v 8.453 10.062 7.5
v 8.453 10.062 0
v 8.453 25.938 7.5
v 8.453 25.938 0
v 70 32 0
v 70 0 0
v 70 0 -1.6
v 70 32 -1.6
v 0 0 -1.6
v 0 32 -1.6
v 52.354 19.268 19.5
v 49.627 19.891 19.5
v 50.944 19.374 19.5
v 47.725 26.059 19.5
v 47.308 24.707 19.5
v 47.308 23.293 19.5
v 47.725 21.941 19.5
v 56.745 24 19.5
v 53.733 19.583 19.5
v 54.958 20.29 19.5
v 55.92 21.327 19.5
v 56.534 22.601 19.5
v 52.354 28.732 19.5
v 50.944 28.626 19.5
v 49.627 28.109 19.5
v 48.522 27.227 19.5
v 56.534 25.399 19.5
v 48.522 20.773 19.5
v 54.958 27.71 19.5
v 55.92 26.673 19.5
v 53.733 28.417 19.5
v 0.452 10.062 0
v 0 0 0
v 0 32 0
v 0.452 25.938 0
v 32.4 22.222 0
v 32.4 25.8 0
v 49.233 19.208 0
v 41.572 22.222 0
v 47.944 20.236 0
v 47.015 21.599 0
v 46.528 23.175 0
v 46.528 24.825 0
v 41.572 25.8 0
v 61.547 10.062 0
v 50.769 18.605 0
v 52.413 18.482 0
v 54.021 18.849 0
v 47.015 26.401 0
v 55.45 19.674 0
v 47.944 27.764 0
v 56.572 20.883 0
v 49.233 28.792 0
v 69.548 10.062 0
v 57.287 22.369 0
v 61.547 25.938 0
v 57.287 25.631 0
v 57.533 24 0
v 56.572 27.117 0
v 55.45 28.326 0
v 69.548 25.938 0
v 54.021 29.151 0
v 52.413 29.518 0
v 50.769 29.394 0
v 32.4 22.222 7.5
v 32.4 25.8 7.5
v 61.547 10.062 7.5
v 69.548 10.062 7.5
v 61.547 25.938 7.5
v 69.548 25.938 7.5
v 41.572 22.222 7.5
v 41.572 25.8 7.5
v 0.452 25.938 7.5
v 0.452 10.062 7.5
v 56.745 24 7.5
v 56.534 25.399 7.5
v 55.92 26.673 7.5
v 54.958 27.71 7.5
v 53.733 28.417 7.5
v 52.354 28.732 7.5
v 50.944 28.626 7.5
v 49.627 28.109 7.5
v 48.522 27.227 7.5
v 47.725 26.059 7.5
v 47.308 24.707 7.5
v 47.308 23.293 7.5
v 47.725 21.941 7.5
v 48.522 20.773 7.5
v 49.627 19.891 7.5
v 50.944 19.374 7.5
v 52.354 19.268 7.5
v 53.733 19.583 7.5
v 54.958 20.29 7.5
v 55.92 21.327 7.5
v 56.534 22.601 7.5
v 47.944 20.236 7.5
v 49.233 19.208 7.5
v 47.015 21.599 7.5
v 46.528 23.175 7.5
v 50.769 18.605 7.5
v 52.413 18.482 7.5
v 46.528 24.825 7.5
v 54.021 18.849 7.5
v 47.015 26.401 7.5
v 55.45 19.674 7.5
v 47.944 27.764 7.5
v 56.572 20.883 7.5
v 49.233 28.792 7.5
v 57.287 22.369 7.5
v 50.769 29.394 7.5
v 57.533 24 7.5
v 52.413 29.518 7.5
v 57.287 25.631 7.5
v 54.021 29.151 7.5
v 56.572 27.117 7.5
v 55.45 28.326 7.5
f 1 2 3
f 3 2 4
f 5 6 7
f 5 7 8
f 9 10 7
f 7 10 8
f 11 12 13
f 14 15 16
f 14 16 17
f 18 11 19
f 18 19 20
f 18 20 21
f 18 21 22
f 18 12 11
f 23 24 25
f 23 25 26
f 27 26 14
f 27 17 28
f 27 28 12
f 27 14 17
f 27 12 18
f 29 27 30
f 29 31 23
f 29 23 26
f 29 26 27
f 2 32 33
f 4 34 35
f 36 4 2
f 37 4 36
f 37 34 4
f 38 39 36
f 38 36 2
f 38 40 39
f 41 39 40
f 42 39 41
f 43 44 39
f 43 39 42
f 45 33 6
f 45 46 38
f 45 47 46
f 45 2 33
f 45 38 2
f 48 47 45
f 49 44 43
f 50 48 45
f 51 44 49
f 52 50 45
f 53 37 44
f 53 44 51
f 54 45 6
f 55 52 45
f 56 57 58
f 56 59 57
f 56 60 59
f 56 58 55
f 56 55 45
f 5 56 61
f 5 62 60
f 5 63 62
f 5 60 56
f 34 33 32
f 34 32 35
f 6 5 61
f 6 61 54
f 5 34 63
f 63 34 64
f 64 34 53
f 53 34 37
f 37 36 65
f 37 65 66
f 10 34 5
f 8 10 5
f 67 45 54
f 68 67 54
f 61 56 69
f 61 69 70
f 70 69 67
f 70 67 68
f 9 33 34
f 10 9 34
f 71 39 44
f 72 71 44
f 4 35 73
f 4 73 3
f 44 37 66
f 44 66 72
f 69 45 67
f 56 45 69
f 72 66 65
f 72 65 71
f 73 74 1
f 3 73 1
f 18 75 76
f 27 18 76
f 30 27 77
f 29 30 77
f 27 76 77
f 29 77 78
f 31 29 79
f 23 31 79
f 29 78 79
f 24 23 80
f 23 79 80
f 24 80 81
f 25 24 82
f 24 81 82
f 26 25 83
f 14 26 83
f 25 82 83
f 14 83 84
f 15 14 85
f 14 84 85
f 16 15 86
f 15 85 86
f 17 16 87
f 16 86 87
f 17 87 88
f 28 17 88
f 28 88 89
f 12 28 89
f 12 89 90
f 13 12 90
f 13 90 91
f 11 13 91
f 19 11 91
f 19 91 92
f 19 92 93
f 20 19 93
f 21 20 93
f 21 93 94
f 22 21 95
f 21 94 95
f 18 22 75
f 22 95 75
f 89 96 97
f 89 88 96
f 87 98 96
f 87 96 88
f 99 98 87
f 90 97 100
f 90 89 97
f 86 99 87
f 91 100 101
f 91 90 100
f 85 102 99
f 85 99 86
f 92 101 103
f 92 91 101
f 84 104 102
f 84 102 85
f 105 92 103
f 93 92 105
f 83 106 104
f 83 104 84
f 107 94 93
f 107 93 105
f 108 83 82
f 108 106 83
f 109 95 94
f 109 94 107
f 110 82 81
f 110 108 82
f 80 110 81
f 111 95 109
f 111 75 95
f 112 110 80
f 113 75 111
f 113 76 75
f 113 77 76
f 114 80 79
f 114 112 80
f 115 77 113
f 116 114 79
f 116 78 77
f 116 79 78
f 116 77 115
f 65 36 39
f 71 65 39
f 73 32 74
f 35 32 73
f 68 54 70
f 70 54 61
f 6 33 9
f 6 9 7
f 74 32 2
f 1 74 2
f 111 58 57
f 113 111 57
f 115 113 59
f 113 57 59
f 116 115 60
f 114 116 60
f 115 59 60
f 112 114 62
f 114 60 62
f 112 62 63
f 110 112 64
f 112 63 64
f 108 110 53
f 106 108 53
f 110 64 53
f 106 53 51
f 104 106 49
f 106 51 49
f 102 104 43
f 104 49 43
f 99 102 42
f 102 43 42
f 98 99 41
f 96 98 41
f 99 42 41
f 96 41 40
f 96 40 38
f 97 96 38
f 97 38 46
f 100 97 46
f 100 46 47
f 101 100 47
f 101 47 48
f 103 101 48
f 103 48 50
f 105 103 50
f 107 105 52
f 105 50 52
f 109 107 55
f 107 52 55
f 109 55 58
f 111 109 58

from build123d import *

# Parameters (mm, degrees)
SKETCH2_W           = 69.99986
SKETCH2_H           = 31.999936
BOSS_EXTRUDE1_DEPTH = 1.6
SKETCH3_R           = 5.533230125
SKETCH3_W           = 8.0009746
SKETCH3_H           = 15.8759652
SKETCH3_W_2         = 9.1719654
SKETCH3_H_2         = 3.5780218
BOSS_EXTRUDE2_DEPTH = 7.5
SKETCH4_R           = 4.745015856
BOSS_EXTRUDE3_DEPTH = 12


with BuildPart() as part:
    # Sketch2 → Boss-Extrude1 (new body)
    with BuildSketch(Plane.XY):
        with Locations((34.99993, 15.999968)):
            Rectangle(SKETCH2_W, SKETCH2_H)
    extrude(amount=-BOSS_EXTRUDE1_DEPTH)

    # Sketch3 → Boss-Extrude2 (add)
    with BuildSketch(Plane.XY):
        with Locations((51.999892991, 23.999962155)):
            Circle(SKETCH3_R)
        with Locations((65.5473543, 17.999964)):
            Rectangle(SKETCH3_W, SKETCH3_H)
        with Locations((4.4525057, 17.999964)):
            Rectangle(SKETCH3_W, SKETCH3_H)
        with Locations((36.9859433, 24.0110899)):
            Rectangle(SKETCH3_W_2, SKETCH3_H_2)
    extrude(amount=BOSS_EXTRUDE2_DEPTH)

    # Sketch4 → Boss-Extrude3 (add)
    with BuildSketch(Plane.XY.offset(7.5)):
        with Locations((51.999892991, 23.999962155)):
            Circle(SKETCH4_R)
    extrude(amount=BOSS_EXTRUDE3_DEPTH)


solid = part.part
